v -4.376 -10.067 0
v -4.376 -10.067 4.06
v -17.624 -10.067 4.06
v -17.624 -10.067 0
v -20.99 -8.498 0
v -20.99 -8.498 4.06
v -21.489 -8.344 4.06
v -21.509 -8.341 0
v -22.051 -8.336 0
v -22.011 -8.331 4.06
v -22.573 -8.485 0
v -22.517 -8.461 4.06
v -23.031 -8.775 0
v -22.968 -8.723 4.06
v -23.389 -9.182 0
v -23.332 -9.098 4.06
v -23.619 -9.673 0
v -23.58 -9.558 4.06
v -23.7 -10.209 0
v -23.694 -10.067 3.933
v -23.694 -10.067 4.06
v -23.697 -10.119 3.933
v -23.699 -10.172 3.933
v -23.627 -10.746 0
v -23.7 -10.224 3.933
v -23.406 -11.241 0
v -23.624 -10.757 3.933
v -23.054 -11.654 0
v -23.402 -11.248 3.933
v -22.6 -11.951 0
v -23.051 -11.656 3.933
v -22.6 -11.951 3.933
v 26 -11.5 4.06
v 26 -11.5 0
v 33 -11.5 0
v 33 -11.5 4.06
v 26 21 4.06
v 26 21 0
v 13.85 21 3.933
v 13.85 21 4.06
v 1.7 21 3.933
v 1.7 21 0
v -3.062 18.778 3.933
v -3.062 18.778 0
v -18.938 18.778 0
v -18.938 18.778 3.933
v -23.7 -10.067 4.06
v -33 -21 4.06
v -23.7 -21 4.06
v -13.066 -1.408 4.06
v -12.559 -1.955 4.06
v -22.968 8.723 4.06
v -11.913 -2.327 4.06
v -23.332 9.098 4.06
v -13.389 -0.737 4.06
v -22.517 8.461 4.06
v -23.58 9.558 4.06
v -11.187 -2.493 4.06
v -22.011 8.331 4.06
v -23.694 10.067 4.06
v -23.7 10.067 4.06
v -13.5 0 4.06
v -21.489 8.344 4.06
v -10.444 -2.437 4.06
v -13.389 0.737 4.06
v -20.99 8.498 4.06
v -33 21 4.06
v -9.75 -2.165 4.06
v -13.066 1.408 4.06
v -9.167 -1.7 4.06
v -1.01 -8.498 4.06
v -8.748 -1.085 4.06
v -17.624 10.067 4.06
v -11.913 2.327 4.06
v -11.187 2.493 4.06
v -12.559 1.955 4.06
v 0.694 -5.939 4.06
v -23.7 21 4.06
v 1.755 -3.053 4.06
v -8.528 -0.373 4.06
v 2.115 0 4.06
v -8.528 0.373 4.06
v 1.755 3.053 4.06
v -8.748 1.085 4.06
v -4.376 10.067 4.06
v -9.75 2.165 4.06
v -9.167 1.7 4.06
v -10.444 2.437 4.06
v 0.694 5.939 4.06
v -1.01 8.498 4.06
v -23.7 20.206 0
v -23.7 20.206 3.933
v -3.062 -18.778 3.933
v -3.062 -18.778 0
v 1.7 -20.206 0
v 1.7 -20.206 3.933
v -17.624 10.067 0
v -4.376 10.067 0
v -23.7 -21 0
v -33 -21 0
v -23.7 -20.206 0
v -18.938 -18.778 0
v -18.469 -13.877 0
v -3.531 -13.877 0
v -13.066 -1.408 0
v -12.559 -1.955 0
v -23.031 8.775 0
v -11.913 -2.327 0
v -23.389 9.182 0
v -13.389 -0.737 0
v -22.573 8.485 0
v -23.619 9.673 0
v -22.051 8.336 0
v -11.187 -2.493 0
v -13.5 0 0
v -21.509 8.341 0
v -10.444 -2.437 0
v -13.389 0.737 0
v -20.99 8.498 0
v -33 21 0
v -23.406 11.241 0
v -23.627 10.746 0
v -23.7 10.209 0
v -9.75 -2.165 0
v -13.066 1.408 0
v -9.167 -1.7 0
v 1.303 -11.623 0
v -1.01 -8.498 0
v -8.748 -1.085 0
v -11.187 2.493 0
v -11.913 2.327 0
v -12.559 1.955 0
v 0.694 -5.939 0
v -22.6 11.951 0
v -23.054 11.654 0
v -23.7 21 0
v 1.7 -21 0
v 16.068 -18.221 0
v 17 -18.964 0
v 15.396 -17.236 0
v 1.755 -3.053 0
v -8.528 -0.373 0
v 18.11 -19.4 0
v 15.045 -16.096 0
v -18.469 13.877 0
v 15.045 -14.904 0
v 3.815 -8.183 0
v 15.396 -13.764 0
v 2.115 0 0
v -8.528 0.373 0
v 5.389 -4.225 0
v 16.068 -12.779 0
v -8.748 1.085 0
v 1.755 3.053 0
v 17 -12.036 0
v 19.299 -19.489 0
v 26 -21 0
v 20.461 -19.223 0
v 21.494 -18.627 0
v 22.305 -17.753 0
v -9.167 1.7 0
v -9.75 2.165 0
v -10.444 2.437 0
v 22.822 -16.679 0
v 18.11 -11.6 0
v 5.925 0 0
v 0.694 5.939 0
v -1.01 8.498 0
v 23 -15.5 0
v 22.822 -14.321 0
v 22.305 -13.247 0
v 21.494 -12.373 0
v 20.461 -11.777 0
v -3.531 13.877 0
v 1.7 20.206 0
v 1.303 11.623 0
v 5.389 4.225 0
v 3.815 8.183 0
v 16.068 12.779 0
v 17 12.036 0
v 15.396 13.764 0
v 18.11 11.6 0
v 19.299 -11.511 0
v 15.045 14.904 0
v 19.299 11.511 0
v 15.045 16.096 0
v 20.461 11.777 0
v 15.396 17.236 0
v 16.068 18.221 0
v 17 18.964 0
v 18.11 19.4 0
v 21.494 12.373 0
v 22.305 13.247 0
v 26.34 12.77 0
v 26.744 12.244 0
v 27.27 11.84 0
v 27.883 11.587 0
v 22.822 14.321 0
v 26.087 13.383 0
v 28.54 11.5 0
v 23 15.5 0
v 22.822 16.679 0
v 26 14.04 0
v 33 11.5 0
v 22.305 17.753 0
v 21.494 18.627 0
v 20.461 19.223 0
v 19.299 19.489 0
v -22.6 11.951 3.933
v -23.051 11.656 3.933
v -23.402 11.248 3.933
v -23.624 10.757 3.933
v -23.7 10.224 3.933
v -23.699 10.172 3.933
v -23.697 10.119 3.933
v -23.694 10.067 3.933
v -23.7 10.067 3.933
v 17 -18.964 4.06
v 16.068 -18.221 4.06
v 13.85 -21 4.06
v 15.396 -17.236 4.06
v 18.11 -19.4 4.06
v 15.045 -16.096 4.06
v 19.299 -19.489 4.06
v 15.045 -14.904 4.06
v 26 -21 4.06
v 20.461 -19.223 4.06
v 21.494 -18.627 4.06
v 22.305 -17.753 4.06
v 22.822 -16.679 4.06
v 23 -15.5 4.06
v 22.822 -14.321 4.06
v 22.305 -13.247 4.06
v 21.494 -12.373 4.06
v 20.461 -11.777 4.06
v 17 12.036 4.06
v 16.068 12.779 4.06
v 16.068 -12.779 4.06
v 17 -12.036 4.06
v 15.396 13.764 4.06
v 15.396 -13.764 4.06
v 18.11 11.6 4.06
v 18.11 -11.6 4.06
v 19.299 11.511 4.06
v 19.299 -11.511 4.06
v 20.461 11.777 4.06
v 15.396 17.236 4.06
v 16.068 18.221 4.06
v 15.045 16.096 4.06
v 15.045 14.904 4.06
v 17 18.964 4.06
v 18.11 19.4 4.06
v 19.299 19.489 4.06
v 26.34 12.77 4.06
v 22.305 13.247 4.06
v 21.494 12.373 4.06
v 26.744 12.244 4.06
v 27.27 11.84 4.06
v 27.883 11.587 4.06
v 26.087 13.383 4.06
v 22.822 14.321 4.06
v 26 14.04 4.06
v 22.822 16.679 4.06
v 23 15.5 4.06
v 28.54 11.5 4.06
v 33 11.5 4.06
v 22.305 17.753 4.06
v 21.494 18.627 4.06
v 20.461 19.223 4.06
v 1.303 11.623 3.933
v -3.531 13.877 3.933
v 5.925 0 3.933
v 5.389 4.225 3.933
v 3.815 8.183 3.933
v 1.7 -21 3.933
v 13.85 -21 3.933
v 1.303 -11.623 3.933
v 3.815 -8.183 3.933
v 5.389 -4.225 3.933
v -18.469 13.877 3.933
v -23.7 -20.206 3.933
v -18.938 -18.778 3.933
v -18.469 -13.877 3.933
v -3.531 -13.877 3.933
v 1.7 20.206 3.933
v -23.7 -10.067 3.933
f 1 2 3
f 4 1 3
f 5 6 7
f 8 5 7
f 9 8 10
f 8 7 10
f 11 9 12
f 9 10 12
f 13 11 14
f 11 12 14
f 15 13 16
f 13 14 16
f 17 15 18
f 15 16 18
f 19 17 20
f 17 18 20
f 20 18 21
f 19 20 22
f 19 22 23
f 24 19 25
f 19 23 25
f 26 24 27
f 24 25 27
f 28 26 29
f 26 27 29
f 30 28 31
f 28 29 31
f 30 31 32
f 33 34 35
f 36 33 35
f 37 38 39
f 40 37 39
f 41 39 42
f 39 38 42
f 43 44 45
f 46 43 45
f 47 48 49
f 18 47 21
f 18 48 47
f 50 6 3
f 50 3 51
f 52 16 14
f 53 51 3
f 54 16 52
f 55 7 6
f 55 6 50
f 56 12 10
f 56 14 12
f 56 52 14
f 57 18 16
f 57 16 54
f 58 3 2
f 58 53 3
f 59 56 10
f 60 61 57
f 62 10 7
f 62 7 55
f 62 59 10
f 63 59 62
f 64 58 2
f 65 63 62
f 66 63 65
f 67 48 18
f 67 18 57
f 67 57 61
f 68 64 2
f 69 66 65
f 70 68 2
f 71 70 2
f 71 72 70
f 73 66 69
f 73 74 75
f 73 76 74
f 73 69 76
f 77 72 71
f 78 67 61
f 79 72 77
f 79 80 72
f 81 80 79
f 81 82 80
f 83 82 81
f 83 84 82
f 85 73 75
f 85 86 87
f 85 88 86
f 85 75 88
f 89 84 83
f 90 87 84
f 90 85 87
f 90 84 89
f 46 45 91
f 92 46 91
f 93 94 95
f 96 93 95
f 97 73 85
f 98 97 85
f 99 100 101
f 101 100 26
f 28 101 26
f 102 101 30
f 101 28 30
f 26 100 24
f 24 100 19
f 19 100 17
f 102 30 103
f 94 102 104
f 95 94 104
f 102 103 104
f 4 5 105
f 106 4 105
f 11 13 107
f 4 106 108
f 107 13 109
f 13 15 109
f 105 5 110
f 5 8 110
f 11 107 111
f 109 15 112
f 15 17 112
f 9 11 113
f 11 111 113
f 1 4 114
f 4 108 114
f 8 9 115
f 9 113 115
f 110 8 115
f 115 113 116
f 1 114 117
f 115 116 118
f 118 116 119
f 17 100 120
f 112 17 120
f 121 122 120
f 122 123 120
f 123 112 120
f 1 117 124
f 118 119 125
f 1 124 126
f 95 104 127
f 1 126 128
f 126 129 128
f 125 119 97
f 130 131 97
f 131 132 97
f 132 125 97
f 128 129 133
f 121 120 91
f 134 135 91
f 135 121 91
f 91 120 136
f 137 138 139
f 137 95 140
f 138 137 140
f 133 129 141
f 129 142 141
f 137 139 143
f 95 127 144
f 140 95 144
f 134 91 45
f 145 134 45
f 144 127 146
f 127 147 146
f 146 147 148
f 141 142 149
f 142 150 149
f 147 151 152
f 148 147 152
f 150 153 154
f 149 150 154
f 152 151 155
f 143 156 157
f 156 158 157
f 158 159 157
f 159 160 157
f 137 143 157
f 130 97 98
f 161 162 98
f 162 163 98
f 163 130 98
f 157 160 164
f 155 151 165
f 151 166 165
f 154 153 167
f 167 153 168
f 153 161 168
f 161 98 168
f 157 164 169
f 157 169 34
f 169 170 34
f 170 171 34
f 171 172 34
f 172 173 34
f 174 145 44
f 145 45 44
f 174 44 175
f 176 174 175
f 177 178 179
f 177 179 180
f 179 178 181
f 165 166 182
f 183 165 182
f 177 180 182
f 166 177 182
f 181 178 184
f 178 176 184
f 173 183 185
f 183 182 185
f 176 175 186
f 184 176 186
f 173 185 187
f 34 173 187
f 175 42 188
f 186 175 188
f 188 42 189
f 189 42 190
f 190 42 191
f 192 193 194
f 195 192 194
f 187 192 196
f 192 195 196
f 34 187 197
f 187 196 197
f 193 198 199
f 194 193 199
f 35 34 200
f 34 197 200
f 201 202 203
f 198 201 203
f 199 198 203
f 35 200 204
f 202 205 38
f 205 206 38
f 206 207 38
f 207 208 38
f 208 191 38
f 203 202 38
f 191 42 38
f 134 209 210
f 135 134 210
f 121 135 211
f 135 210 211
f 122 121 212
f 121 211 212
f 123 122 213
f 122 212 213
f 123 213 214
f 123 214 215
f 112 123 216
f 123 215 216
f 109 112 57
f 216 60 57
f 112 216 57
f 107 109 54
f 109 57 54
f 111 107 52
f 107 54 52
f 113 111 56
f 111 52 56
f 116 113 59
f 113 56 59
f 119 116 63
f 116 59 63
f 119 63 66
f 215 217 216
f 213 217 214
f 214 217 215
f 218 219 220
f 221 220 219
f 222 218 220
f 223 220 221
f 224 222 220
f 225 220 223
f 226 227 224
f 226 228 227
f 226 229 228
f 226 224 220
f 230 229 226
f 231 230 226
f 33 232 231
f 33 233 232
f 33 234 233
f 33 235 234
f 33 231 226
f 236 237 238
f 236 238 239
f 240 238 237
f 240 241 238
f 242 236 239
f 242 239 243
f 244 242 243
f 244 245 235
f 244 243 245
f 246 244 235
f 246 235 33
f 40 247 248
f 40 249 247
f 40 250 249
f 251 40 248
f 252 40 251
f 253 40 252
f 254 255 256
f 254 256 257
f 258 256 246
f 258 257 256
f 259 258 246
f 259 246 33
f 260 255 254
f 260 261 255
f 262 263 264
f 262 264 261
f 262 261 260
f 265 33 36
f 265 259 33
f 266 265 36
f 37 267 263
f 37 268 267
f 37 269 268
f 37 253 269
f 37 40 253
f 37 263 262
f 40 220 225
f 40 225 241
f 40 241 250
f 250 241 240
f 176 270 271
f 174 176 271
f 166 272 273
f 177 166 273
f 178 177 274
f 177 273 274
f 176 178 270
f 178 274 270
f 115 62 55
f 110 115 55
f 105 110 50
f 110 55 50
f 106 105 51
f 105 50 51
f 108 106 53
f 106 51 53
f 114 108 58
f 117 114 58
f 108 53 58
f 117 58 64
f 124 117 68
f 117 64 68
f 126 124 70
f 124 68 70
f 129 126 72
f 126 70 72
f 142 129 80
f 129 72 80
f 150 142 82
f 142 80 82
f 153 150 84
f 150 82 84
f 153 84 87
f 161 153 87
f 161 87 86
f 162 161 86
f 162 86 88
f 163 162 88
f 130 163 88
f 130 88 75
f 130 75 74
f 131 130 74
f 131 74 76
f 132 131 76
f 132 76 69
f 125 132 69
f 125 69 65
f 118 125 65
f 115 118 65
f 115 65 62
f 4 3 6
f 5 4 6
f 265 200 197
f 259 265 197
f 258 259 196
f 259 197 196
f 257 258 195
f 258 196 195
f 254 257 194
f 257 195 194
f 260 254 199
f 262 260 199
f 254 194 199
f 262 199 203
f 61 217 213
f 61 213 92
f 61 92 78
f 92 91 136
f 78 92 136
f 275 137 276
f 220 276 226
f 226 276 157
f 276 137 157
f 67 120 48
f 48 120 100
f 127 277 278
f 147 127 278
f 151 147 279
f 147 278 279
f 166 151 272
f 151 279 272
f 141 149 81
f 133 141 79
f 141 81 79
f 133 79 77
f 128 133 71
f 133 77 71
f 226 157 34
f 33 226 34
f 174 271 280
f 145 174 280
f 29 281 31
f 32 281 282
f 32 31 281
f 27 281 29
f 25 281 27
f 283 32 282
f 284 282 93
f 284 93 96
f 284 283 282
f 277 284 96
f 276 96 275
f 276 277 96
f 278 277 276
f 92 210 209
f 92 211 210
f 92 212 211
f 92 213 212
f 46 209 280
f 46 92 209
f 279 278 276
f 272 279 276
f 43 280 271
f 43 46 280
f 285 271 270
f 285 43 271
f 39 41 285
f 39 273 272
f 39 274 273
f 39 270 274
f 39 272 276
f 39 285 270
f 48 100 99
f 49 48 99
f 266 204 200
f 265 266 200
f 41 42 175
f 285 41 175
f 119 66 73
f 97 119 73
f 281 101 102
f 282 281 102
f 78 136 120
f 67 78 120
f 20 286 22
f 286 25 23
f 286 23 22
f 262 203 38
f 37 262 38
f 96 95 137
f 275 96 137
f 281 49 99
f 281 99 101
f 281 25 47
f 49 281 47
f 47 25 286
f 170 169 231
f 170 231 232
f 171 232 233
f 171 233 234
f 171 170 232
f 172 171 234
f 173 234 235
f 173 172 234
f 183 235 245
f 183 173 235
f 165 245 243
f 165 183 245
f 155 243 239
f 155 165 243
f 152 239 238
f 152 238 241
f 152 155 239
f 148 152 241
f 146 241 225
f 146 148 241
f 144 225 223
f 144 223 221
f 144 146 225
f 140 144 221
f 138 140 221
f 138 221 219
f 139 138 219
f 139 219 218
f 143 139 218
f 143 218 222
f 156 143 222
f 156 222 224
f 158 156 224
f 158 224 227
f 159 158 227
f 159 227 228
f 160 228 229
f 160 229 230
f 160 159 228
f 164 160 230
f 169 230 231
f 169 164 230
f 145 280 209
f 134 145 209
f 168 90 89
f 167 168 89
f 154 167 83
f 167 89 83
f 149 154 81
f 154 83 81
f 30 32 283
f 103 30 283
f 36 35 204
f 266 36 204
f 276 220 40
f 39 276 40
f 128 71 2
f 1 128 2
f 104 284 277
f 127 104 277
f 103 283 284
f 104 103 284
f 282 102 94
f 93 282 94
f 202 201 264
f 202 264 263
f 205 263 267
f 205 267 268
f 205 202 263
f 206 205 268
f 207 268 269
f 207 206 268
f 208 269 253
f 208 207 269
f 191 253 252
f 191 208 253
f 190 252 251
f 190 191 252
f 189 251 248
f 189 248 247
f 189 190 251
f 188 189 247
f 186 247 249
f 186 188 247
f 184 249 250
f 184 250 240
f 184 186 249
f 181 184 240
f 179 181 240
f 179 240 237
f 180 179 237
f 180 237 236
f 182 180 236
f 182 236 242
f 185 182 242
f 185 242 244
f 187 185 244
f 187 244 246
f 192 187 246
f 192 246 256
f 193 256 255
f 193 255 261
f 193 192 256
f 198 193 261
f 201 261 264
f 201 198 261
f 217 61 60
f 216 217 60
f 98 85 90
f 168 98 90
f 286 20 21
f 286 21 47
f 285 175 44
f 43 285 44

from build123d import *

# Parameters (mm, degrees)
F1_R     = 4
F2_DEPTH = 4.06
F3_D     = 5
F5_DEPTH = 25.4
F7_DEPTH = 25.4
F9_DEPTH = 0.127


with BuildPart() as f2:
    # F1 (on Top) → F2 (new body)
    with BuildSketch(Plane.XY):
        with BuildLine():
            Line((26, 14.04), (26, 21))
            Line((26, 21), (-33, 21))
            Line((-33, 21), (-33, -21))
            Line((-33, -21), (26, -21))
            Line((26, -21), (26, -11.5))
            Line((26, -11.5), (33, -11.5))
            Line((33, -11.5), (33, 11.5))
            Line((33, 11.5), (28.54, 11.5))
            ThreePointArc((28.54, 11.5), (26.7439487758, 12.2439487758), (26, 14.04))
        make_face()
        with Locations((19, -15.5)):
            Circle(F1_R, mode=Mode.SUBTRACT)
        with Locations((19, 15.5)):
            Circle(F1_R, mode=Mode.SUBTRACT)
    extrude(amount=F2_DEPTH)

    # F3 (through all)
    with Locations(Plane(origin=(0, 0, 0), x_dir=(1, 0, 0), z_dir=(0, 0, -1))):
        with Locations((-11, 0)):
            Hole(F3_D / 2)

    # F4 (on face) → F5 (cut)
    with BuildSketch(Plane(origin=(0, 0, 0), x_dir=(1, 0, 0), z_dir=(0, 0, -1))):
        Polygon((-23.7, -20.20625), (-23.7, -21), (1.7, -21), (1.7, -20.20625), (-3.0625, -18.7775), (-18.9375, -18.7775), align=None)
        Polygon((1.7, 21), (-23.7, 21), (-23.7, 20.20625), (-18.9375, 18.7775), (-3.0625, 18.7775), (1.7, 20.20625), align=None)
    extrude(amount=-F5_DEPTH, mode=Mode.SUBTRACT)

    # F6 (on face) → F7 (cut)
    with BuildSketch(Plane.XY.offset(4.06)):
        with BuildLine():
            ThreePointArc((-22.6000877886, 11.9506443438), (-23.5215163343, 9.4190402209), (-20.9899122114, 8.4976116752))
            Line((-20.9899122114, 8.4976116752), (-17.6239996184, 10.067162494))
            Line((-17.6239996184, 10.067162494), (-4.3760003816, 10.067162494))
            Line((-4.3760003816, 10.067162494), (-1.0100877886, 8.4976116752))
            ThreePointArc((-1.0100877886, 8.4976116752), (1.3090855116, 4.5270480494), (2.1151725179, 0))
            ThreePointArc((2.1151725179, 0), (1.3090855116, -4.5270480494), (-1.0100877886, -8.4976116752))
            Line((-1.0100877886, -8.4976116752), (-4.3760003816, -10.067162494))
            Line((-4.3760003816, -10.067162494), (-17.6239996184, -10.067162494))
            Line((-17.6239996184, -10.067162494), (-20.9899122114, -8.4976116752))
            ThreePointArc((-20.9899122114, -8.4976116752), (-23.5215163343, -9.4190402209), (-22.6000877886, -11.9506443438))
            Line((-22.6000877886, -11.9506443438), (-18.4686562831, -13.877162494))
            Line((-18.4686562831, -13.877162494), (-3.5313437169, -13.877162494))
            Line((-3.5313437169, -13.877162494), (1.3034740029, -11.6226499654))
            ThreePointArc((1.3034740029, -11.6226499654), (4.7273628563, -6.253920558), (5.9251725179, 0))
            ThreePointArc((5.9251725179, 0), (4.7273628563, 6.253920558), (1.3034740029, 11.6226499654))
            Line((1.3034740029, 11.6226499654), (-3.5313437169, 13.877162494))
            Line((-3.5313437169, 13.877162494), (-18.4686562831, 13.877162494))
            Line((-18.4686562831, 13.877162494), (-22.6000877886, 11.9506443438))
        make_face()
    extrude(amount=-F7_DEPTH, mode=Mode.SUBTRACT)

    # F8 (on face) → F9 (cut)
    with BuildSketch(Plane.XY.offset(4.06)):
        Polygon((13.85, 21), (-23.7, 21), (-23.7, 10.067162494), (2.1151725179, 10.067162494), (2.1151725179, -10.067162494), (-23.7, -10.067162494), (-23.7, -21), (13.85, -21), (13.85, 0), align=None)
    extrude(amount=-F9_DEPTH, mode=Mode.SUBTRACT)


solid = f2.part
